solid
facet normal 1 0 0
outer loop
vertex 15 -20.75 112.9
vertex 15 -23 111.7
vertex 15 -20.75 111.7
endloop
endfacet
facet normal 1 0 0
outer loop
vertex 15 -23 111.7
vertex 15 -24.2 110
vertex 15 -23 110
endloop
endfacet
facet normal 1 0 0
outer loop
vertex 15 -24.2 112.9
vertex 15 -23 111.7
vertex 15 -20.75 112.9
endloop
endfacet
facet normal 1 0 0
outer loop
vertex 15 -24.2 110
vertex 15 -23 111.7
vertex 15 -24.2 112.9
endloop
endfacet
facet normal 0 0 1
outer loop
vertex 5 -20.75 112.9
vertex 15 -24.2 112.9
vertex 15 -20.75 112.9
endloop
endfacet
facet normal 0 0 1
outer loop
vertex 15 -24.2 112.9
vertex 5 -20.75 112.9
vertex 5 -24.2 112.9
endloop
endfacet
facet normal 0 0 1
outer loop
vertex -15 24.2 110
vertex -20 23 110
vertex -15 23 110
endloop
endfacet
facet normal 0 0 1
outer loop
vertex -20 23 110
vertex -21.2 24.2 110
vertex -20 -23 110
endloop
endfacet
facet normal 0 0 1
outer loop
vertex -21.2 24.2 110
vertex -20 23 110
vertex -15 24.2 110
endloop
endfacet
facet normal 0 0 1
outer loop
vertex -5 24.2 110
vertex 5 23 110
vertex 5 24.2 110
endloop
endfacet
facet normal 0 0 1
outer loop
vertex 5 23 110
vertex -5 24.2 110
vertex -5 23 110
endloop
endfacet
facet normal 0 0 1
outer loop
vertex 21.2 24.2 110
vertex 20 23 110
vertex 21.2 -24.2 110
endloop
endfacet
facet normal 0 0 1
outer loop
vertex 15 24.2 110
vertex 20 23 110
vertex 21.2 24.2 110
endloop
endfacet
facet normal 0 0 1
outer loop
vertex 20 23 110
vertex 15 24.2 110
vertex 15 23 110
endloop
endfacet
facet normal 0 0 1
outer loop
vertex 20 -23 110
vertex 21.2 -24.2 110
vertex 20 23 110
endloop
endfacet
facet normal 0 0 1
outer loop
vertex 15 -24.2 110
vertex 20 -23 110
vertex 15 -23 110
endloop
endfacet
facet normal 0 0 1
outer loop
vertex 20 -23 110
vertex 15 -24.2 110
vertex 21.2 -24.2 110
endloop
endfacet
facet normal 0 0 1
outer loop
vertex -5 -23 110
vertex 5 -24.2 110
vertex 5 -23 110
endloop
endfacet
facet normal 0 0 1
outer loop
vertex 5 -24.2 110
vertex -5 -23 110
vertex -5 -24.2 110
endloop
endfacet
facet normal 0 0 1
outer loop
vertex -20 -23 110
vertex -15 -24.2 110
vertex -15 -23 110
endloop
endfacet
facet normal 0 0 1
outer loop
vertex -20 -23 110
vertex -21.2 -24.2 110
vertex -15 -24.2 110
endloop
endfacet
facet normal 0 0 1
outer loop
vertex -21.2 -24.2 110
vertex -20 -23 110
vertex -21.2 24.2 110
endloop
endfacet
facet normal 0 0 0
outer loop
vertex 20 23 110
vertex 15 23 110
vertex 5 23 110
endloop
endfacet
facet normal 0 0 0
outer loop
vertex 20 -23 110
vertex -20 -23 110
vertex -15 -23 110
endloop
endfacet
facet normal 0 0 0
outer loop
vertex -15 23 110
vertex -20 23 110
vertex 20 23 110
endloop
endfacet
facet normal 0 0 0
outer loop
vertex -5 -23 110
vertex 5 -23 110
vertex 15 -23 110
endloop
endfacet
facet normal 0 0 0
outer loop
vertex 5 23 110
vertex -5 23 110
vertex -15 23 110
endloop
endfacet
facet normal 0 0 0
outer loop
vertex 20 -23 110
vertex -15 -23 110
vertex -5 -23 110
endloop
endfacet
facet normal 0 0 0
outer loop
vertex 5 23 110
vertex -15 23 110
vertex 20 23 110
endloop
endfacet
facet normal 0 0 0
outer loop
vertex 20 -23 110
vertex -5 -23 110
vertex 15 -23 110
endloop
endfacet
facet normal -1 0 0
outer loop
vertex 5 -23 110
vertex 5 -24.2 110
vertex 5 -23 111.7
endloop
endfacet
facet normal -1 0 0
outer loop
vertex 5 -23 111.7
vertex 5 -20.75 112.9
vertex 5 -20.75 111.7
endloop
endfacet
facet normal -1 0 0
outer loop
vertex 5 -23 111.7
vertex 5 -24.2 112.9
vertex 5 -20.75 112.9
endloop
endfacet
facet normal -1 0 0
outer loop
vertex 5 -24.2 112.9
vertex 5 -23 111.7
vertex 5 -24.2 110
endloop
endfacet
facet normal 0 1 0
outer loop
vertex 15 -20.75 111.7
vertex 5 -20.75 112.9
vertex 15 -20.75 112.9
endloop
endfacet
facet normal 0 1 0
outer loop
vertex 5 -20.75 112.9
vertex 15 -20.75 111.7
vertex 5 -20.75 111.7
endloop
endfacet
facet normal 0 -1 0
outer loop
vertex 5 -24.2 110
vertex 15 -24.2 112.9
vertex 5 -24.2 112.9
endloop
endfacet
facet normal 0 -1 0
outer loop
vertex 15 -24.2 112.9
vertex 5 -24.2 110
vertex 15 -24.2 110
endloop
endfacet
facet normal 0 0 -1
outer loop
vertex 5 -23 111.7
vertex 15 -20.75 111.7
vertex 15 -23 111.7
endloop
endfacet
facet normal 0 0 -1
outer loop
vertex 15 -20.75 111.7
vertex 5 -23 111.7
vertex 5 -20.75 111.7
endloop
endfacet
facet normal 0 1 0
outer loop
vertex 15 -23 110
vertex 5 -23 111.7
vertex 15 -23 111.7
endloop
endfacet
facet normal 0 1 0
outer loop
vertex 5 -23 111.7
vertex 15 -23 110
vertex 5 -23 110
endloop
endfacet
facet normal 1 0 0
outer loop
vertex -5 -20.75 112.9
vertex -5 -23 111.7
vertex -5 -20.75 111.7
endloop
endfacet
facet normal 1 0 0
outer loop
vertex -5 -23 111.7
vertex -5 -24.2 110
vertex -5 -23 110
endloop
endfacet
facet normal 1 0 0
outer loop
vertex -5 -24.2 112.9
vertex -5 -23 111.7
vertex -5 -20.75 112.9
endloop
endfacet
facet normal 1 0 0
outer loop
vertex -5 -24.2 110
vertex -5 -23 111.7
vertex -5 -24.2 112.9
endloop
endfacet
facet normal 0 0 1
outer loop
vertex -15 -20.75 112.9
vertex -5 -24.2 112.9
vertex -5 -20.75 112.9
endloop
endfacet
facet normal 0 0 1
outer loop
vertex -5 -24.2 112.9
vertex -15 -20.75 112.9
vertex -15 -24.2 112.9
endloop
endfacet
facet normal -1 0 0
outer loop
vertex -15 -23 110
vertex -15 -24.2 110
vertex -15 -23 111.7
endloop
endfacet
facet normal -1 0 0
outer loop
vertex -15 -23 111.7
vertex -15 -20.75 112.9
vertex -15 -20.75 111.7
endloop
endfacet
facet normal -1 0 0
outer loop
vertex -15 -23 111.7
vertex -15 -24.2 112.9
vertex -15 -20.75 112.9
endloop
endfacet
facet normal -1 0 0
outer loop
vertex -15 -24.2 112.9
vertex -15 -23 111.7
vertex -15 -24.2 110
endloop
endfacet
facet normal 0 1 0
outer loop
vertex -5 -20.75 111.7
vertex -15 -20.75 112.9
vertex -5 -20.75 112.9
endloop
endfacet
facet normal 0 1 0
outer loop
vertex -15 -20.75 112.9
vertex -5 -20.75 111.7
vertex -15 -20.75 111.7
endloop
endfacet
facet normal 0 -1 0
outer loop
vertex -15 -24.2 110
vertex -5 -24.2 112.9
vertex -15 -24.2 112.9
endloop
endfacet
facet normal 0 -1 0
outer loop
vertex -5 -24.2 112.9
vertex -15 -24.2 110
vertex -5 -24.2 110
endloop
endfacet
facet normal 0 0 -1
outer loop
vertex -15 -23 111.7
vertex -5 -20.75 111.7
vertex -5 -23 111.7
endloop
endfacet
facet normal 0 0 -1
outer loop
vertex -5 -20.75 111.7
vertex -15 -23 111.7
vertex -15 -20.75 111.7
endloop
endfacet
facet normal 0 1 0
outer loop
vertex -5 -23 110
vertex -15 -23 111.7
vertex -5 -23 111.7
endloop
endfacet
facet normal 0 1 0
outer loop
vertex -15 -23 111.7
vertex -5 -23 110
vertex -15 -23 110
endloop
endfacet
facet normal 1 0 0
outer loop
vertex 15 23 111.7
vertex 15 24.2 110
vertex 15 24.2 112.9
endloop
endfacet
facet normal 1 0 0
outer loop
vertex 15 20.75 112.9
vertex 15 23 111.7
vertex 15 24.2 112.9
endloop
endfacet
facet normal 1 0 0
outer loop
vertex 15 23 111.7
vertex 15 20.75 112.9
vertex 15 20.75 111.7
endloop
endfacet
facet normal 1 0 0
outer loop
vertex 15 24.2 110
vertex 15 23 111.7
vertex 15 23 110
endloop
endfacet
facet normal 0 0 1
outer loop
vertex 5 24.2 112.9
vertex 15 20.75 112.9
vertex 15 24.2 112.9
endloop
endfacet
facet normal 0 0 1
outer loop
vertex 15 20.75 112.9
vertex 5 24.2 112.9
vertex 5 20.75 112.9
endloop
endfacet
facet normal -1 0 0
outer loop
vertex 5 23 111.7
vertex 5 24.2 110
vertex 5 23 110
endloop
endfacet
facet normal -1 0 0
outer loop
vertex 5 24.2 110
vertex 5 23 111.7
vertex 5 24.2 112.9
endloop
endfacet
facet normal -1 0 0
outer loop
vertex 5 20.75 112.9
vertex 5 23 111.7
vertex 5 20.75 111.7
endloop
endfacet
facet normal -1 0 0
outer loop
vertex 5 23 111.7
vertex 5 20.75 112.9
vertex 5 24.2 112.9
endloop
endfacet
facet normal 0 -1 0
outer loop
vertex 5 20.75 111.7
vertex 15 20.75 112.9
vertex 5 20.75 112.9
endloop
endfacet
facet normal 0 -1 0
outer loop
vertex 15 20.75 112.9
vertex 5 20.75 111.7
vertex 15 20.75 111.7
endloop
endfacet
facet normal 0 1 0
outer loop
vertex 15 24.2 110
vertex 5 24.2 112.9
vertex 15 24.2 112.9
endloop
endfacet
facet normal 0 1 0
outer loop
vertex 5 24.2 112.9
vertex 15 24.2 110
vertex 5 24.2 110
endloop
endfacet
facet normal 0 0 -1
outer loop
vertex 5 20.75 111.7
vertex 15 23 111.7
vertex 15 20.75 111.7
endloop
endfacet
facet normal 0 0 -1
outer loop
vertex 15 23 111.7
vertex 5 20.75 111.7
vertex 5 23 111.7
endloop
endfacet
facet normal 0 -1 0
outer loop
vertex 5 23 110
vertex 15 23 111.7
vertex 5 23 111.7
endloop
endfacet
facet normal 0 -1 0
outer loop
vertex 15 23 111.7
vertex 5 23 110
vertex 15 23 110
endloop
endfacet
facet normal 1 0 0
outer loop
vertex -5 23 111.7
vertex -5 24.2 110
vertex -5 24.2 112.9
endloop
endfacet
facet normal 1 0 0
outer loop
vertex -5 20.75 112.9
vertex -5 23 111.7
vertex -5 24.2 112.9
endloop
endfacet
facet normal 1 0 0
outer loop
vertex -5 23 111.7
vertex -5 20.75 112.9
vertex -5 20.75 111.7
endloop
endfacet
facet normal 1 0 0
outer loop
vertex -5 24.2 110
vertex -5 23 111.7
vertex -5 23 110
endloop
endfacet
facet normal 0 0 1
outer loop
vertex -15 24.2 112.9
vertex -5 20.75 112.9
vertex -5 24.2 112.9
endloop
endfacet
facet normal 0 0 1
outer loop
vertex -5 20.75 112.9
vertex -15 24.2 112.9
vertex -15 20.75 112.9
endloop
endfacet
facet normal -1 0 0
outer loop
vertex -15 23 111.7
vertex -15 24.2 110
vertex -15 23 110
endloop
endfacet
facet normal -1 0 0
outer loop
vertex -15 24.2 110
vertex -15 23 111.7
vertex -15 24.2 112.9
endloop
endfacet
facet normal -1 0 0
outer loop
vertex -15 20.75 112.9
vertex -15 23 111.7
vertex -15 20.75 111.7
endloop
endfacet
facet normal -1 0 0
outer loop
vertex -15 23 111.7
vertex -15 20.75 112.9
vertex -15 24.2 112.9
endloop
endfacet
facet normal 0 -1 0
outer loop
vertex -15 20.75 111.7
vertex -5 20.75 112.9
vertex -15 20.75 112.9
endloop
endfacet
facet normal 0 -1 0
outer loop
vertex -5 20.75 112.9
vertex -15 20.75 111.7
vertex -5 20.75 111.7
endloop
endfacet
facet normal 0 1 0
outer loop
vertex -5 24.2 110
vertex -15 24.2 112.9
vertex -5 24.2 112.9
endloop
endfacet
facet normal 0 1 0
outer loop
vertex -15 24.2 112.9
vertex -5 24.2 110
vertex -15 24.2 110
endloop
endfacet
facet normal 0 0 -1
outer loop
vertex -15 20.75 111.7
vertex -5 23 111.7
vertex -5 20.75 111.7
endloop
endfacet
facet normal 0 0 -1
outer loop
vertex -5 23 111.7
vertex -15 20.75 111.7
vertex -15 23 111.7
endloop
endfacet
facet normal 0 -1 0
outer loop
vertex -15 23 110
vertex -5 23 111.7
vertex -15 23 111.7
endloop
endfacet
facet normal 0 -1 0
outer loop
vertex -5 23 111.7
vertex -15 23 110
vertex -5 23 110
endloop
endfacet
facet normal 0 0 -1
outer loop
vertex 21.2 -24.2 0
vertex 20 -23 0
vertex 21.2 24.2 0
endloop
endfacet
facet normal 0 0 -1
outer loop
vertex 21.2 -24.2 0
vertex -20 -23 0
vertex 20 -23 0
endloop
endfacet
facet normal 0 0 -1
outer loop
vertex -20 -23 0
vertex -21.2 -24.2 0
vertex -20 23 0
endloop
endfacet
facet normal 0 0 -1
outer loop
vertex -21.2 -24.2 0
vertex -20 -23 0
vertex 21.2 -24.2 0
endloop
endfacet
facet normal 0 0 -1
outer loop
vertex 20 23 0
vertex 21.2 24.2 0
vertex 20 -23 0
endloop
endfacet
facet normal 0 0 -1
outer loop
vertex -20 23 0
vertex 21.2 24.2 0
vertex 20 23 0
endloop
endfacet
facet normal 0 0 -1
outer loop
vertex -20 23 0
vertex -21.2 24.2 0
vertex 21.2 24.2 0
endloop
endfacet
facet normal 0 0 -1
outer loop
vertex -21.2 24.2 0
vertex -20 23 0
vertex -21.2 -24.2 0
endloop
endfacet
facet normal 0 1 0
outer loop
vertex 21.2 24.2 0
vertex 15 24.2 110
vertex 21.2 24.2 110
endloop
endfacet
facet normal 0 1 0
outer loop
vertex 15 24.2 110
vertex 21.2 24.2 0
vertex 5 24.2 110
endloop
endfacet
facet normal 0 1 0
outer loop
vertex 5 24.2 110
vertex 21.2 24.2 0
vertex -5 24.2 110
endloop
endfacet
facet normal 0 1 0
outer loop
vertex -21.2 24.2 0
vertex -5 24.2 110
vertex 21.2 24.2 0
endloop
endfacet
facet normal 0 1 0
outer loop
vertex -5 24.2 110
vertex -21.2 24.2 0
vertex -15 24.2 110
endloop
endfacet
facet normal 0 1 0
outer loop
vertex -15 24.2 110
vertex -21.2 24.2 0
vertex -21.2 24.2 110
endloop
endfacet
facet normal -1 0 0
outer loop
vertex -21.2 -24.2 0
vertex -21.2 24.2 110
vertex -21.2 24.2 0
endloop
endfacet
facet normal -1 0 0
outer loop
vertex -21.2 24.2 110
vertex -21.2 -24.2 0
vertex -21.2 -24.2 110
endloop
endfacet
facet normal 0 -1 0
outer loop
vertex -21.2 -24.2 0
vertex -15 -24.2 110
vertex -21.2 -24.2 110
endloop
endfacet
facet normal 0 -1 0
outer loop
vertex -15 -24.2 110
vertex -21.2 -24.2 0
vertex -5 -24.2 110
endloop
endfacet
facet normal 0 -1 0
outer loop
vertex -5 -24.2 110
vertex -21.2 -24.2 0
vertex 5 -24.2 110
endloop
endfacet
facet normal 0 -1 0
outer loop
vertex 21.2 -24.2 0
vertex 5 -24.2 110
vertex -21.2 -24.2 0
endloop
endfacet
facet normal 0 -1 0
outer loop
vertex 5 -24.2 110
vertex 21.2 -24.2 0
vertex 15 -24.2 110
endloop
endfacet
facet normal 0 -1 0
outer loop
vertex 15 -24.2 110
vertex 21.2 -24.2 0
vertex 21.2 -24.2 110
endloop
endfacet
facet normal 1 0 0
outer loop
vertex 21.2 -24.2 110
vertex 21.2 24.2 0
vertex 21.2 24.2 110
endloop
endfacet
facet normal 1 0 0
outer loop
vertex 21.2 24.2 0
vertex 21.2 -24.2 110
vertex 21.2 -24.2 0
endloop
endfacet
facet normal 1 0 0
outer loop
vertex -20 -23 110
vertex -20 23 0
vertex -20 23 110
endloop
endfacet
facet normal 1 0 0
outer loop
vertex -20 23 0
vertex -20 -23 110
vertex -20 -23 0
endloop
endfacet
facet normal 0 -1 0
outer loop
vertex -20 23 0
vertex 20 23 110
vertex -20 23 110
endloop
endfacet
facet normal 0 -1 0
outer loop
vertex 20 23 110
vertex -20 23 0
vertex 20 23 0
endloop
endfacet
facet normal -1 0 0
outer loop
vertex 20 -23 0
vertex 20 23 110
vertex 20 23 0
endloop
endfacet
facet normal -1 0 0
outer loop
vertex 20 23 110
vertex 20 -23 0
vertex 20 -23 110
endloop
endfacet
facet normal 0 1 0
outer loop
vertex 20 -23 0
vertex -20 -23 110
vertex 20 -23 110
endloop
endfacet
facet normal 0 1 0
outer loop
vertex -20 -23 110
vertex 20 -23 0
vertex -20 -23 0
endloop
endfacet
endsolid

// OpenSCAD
$fn = 128;

t = 1.2;  // material thickness
h = 110;   // total height
d1 = 65;  // bottom
d2 = 65;  // top

board_thickness = 1.6 + 0.1;
board_width = 46;
cut_length = 40;


module hook(w=10, depth=2.25) {
    translate([-w/2, 0, 0])
    difference() {
        cube([w, depth+t, board_thickness + t]);
        translate([0, t, 0])
        cube([w, depth, board_thickness]);
    }
}


module hook_array(shift=10) {
    translate([shift, -board_width/2-t, h]) hook();
    translate([-shift, -board_width/2-t, h]) hook();
    mirror([0, 1, 0]) translate([shift, -board_width/2-t, h]) hook();
    mirror([0, 1, 0]) translate([-shift, -board_width/2-t, h]) hook();
}


module main(square_type=true) {
    if (square_type) {
        linear_extrude(height=h)
        difference() {
            square([cut_length + 2 * t, board_width + 2 * t], center=true);
            square([cut_length, board_width], center=true);
        }
    } else {
        difference() {
            cylinder(h=h, d1=d1, d2=d2);
            cylinder(h=h-t, d1=d1-2*t, d2=d2-2*t);
            translate([0, 0, h])
            cube([cut_length, board_width, 10], center=true);
        }
    }
    hook_array();
}


main();
